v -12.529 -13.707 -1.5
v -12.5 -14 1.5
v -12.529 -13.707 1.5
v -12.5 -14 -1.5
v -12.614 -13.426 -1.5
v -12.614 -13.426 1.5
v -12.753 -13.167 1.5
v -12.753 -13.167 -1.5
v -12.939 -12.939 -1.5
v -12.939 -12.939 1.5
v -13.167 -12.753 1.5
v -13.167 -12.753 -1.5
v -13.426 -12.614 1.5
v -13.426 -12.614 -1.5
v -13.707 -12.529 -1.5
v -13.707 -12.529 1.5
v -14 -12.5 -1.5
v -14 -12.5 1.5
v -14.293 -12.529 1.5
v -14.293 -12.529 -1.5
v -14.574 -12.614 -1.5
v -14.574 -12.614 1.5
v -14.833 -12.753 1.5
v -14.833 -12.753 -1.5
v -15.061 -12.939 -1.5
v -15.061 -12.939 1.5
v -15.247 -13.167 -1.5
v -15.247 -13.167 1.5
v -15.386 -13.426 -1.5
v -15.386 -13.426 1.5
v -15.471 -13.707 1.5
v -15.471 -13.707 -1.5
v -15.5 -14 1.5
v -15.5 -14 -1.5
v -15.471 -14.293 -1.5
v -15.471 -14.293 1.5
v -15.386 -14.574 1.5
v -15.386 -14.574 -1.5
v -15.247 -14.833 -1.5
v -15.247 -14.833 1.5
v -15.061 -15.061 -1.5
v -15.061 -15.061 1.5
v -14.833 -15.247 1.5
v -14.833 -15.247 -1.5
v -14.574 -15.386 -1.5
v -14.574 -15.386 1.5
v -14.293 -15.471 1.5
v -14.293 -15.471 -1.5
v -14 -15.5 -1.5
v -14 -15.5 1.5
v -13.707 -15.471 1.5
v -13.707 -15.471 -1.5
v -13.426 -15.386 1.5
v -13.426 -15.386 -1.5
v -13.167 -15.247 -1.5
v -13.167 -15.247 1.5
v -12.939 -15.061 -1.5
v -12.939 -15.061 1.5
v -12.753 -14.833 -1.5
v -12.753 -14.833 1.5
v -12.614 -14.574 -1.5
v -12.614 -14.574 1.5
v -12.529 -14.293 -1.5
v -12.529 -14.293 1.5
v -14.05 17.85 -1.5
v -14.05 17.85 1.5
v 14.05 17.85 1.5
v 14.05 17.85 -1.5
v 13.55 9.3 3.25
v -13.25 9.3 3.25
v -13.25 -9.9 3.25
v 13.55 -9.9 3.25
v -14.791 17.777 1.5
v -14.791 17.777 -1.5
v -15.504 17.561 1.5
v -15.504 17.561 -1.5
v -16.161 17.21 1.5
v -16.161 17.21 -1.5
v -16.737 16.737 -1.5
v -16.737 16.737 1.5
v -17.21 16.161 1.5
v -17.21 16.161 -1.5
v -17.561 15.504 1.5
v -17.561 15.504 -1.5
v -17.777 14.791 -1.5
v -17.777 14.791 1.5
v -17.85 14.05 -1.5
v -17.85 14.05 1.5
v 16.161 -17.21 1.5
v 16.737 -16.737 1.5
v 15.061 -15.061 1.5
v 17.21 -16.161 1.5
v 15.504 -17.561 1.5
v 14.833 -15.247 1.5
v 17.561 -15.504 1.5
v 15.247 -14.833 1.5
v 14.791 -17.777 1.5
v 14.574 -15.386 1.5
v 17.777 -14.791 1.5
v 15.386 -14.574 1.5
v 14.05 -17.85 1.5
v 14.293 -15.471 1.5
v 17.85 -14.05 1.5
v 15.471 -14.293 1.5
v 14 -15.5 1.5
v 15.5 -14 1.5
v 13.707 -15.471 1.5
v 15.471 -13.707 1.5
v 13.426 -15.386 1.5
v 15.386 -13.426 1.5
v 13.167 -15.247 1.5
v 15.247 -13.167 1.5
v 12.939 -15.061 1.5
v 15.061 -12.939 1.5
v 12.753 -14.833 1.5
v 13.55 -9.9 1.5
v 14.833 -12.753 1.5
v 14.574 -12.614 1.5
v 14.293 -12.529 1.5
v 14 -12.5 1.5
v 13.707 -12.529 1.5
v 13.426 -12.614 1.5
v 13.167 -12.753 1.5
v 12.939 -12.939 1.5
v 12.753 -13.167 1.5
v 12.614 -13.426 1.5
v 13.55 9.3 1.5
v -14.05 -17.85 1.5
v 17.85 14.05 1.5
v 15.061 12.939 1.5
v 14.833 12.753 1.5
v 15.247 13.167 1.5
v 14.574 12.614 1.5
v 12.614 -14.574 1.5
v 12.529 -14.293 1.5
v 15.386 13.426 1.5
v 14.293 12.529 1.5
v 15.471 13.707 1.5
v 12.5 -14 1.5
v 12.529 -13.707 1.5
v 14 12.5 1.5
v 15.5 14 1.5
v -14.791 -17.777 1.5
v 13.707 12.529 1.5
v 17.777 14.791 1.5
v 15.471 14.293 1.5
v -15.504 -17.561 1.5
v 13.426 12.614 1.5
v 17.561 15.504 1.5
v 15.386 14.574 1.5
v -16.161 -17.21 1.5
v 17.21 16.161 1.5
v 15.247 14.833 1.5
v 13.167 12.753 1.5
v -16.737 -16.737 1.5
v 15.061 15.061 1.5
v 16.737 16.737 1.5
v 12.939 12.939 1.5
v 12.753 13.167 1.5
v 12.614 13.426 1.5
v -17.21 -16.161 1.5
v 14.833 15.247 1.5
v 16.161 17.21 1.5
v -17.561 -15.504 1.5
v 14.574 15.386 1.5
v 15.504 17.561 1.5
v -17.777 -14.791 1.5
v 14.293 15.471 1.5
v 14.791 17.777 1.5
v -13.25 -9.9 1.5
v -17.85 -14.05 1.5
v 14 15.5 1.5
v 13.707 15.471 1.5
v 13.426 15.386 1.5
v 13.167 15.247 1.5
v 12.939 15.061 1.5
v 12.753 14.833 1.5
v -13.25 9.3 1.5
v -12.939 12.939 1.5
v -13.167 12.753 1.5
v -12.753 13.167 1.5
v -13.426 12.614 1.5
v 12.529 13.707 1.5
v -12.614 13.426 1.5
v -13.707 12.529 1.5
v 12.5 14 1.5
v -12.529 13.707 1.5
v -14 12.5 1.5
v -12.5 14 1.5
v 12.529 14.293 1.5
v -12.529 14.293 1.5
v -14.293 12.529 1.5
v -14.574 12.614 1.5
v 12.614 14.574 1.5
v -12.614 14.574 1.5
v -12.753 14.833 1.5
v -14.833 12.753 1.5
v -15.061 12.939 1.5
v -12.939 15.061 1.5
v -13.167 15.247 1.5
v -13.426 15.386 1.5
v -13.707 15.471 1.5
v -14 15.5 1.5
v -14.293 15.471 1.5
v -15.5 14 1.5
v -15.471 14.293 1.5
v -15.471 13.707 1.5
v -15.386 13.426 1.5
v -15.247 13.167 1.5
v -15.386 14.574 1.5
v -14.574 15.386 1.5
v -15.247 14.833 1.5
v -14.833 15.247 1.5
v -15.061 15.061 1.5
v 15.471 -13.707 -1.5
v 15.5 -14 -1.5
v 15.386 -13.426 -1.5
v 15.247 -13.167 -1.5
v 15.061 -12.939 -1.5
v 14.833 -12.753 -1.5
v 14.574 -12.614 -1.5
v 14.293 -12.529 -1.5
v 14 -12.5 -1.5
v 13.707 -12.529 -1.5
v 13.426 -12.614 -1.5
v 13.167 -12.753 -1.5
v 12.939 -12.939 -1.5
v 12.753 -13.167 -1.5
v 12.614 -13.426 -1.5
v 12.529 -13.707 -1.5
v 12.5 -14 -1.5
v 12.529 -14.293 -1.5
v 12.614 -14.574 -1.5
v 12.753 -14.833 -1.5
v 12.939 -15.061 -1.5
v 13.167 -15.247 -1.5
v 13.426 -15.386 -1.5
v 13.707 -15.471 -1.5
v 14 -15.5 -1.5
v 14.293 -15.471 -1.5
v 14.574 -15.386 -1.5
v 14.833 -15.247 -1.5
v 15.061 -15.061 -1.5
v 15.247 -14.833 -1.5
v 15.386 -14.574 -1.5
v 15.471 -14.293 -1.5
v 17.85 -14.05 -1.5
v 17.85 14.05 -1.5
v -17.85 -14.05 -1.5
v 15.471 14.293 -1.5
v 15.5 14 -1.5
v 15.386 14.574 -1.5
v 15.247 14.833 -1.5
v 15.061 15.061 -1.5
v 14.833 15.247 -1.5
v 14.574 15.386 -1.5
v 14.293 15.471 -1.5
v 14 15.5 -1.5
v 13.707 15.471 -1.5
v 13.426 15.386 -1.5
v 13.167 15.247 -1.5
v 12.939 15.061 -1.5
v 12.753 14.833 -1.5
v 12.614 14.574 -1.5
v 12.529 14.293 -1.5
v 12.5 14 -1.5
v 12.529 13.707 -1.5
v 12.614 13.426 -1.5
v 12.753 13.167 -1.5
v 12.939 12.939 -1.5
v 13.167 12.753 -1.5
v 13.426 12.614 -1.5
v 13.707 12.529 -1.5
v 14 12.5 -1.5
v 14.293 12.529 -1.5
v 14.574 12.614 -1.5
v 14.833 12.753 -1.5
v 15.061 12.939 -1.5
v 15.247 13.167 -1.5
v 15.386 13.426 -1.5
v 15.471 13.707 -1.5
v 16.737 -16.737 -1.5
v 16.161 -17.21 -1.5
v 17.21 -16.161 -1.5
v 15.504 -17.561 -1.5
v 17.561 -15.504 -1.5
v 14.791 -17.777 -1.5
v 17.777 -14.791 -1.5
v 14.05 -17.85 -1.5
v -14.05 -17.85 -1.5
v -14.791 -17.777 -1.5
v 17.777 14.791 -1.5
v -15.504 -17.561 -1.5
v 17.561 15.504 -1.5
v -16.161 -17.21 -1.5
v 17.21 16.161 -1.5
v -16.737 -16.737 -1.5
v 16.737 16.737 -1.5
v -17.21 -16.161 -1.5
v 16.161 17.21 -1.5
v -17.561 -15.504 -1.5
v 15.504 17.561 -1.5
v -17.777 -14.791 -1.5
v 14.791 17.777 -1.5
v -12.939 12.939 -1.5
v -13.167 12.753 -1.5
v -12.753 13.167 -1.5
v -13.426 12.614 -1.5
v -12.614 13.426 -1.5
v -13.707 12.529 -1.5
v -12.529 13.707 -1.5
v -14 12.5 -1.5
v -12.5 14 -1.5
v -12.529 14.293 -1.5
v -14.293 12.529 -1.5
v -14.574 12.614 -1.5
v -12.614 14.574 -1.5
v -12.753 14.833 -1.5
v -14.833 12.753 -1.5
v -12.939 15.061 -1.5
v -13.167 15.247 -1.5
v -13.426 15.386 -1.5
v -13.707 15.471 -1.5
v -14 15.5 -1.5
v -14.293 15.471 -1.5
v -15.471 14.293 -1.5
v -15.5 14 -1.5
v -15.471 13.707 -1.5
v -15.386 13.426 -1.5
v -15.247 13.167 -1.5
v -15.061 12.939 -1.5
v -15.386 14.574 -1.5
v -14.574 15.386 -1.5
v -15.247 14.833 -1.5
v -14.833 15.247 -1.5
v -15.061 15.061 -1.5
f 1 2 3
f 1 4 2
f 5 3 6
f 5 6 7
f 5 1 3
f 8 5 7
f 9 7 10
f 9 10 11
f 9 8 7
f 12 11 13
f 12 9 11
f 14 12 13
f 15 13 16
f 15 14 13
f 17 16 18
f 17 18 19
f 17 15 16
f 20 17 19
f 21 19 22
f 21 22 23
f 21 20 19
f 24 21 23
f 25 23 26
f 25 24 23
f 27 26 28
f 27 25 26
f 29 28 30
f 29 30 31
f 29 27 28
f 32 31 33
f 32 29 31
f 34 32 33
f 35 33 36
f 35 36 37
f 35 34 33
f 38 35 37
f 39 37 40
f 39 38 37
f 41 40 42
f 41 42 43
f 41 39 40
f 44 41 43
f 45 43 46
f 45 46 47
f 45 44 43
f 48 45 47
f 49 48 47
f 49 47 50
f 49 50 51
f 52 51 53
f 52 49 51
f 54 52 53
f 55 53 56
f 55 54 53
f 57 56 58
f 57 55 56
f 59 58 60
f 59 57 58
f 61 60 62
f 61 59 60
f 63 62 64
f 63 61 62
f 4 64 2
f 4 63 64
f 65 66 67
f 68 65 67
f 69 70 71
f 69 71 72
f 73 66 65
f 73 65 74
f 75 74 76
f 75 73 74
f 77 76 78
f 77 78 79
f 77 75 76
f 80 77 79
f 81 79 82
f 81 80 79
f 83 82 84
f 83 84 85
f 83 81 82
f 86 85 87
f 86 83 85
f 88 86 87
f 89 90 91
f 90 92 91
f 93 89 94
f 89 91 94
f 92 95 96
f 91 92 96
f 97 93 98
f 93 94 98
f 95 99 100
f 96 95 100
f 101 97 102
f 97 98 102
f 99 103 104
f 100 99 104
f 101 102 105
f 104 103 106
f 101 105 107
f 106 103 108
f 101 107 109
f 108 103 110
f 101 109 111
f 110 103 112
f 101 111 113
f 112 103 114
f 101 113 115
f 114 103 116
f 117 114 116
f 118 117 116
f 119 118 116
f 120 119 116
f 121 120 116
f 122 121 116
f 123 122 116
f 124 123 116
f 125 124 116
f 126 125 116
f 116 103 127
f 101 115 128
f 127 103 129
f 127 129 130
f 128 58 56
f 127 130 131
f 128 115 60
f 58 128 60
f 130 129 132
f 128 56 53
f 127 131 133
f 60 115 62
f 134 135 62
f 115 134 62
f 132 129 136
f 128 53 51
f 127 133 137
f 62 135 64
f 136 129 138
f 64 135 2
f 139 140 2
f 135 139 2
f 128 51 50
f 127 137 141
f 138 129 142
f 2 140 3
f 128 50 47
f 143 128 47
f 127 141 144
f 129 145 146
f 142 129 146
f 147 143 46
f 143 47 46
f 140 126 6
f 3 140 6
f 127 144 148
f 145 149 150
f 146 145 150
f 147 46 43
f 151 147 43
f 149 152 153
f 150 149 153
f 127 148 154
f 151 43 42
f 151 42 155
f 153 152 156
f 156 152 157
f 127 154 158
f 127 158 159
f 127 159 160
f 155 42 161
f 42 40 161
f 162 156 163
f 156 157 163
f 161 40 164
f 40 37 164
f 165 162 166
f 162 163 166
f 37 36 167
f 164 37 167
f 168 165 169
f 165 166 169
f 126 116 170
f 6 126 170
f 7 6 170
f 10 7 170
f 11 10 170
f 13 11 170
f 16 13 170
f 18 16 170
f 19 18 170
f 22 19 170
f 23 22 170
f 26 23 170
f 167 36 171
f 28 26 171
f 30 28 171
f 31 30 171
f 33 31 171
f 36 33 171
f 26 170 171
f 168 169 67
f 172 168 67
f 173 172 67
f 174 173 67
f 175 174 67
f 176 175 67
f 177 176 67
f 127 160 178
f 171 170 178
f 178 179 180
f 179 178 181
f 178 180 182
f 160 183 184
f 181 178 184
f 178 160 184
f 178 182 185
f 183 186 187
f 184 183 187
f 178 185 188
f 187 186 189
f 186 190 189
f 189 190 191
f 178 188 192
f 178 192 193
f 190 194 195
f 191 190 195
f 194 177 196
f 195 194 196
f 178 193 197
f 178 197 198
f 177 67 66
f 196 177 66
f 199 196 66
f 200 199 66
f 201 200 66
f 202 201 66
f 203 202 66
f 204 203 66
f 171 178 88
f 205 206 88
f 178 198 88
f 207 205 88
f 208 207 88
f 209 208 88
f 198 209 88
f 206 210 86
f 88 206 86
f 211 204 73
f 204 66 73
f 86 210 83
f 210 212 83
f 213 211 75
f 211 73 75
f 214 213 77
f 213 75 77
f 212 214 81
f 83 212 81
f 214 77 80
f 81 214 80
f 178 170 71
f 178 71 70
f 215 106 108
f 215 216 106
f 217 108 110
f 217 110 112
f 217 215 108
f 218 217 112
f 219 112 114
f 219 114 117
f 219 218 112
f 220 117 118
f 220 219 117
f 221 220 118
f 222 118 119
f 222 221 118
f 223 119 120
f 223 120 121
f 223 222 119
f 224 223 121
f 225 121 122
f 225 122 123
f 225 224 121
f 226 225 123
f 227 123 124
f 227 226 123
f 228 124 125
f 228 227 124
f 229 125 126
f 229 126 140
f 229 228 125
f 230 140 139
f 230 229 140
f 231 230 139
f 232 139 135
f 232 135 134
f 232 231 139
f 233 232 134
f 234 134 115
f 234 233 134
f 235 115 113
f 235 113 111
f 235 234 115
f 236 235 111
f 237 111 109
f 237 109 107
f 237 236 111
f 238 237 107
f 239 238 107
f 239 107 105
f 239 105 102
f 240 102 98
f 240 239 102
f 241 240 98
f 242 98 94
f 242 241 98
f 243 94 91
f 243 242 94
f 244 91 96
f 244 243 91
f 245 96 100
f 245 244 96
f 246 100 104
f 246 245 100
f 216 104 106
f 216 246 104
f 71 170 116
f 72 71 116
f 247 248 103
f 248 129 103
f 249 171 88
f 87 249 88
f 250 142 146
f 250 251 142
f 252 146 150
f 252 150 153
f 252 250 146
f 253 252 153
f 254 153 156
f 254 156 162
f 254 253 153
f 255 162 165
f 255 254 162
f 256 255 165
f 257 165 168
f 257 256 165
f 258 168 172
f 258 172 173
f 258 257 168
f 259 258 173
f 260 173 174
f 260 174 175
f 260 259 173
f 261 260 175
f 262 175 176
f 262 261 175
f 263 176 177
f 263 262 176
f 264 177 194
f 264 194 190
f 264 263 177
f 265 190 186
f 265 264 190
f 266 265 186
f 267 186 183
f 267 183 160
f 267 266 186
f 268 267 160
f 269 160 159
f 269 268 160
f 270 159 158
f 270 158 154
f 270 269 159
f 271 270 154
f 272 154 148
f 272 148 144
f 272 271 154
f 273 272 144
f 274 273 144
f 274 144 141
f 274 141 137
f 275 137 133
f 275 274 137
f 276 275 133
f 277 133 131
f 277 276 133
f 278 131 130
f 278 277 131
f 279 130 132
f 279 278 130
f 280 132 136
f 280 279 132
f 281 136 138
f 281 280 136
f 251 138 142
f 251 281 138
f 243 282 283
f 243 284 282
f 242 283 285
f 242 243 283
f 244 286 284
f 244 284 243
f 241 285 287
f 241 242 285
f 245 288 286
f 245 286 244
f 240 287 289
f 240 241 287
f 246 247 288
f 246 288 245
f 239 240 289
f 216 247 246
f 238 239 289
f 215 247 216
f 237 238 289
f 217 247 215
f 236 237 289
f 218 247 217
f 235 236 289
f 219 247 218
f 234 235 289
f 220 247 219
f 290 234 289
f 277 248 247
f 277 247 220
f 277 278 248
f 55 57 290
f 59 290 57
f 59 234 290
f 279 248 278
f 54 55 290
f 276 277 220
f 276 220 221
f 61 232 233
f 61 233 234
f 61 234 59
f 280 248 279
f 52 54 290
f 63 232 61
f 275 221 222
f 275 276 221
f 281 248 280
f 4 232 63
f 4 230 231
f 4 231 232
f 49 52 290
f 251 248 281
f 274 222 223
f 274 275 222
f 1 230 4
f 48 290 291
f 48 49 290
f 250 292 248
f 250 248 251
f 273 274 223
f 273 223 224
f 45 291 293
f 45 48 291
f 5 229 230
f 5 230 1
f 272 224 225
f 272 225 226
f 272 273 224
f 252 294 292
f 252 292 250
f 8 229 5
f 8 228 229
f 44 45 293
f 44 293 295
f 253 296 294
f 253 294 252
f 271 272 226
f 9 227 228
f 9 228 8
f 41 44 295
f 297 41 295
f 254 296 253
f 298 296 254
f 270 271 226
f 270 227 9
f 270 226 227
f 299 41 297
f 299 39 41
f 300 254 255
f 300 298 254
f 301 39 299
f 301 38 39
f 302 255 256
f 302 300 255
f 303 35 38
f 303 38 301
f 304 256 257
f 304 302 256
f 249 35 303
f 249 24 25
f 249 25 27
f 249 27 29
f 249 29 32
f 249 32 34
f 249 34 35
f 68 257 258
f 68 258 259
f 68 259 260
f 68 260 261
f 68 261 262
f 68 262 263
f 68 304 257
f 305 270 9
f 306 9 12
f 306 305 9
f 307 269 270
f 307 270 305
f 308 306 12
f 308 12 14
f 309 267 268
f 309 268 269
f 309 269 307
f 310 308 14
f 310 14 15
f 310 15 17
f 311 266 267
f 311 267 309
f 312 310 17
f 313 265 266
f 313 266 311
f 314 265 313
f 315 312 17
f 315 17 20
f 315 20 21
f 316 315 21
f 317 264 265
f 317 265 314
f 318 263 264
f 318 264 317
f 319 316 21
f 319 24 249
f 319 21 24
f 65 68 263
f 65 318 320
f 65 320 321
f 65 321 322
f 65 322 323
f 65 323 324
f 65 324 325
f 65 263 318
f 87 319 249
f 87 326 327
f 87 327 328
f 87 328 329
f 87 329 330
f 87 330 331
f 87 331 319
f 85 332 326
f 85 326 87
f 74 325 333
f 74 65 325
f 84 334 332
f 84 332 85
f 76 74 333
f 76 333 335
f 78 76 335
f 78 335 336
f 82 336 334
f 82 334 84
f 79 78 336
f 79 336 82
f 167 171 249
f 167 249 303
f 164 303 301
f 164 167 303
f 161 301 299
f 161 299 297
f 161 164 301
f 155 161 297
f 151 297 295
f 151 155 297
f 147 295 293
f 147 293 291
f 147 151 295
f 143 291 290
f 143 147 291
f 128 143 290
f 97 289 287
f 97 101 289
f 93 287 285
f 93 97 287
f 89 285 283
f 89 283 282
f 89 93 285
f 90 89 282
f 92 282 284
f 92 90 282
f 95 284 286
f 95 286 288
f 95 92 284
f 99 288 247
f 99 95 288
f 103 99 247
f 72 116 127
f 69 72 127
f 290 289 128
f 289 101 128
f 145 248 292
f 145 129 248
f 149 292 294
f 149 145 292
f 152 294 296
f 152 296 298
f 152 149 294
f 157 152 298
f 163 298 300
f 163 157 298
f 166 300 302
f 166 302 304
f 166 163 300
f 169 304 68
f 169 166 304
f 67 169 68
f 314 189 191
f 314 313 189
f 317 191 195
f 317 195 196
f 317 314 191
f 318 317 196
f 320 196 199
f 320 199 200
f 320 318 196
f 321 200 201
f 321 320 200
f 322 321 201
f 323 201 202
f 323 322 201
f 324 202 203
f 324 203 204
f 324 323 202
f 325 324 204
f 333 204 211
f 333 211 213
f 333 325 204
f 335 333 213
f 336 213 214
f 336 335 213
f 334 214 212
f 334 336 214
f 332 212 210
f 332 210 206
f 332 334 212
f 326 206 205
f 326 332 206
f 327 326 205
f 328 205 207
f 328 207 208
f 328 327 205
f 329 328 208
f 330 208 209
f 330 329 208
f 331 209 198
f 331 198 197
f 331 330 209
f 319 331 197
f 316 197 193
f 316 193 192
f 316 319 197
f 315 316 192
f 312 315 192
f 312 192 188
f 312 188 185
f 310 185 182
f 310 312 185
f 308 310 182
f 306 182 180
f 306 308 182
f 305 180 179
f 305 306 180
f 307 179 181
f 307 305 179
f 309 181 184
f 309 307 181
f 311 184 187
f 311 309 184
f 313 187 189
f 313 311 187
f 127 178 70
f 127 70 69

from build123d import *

# Parameters (mm, degrees)
SKETCH_R     = 1.5
PAD_DEPTH    = 1.5
SKETCH001_W  = 26.8
SKETCH001_H  = 19.2
PAD001_DEPTH = 1.75


with BuildPart() as part:
    # Sketch → Pad (new body, symmetric)
    with BuildSketch(Plane.XY):
        with BuildLine():
            Line((-14.05, 17.85), (14.05, 17.85))
            ThreePointArc((17.85, 14.05), (16.737006, 16.737006), (14.05, 17.85))
            Line((17.85, 14.05), (17.85, -14.05))
            ThreePointArc((14.05, -17.85), (16.737006, -16.737006), (17.85, -14.05))
            Line((14.05, -17.85), (-14.05, -17.85))
            ThreePointArc((-17.85, -14.05), (-16.737006, -16.737006), (-14.05, -17.85))
            Line((-17.85, -14.05), (-17.85, 14.05))
            ThreePointArc((-14.05, 17.85), (-16.737006, 16.737006), (-17.85, 14.05))
        make_face()
        with Locations((-14, 14)):
            Circle(SKETCH_R, mode=Mode.SUBTRACT)
        with Locations((-14, -14)):
            Circle(SKETCH_R, mode=Mode.SUBTRACT)
        with Locations((14, -14)):
            Circle(SKETCH_R, mode=Mode.SUBTRACT)
        with Locations((14, 14)):
            Circle(SKETCH_R, mode=Mode.SUBTRACT)
    extrude(amount=PAD_DEPTH, both=True)

    # Sketch001 → Pad001 (new body)
    with BuildSketch(Plane.XY.offset(1.5)):
        with Locations((0.15, -0.3)):
            Rectangle(SKETCH001_W, SKETCH001_H)
    extrude(amount=PAD001_DEPTH)


solid = part.part
